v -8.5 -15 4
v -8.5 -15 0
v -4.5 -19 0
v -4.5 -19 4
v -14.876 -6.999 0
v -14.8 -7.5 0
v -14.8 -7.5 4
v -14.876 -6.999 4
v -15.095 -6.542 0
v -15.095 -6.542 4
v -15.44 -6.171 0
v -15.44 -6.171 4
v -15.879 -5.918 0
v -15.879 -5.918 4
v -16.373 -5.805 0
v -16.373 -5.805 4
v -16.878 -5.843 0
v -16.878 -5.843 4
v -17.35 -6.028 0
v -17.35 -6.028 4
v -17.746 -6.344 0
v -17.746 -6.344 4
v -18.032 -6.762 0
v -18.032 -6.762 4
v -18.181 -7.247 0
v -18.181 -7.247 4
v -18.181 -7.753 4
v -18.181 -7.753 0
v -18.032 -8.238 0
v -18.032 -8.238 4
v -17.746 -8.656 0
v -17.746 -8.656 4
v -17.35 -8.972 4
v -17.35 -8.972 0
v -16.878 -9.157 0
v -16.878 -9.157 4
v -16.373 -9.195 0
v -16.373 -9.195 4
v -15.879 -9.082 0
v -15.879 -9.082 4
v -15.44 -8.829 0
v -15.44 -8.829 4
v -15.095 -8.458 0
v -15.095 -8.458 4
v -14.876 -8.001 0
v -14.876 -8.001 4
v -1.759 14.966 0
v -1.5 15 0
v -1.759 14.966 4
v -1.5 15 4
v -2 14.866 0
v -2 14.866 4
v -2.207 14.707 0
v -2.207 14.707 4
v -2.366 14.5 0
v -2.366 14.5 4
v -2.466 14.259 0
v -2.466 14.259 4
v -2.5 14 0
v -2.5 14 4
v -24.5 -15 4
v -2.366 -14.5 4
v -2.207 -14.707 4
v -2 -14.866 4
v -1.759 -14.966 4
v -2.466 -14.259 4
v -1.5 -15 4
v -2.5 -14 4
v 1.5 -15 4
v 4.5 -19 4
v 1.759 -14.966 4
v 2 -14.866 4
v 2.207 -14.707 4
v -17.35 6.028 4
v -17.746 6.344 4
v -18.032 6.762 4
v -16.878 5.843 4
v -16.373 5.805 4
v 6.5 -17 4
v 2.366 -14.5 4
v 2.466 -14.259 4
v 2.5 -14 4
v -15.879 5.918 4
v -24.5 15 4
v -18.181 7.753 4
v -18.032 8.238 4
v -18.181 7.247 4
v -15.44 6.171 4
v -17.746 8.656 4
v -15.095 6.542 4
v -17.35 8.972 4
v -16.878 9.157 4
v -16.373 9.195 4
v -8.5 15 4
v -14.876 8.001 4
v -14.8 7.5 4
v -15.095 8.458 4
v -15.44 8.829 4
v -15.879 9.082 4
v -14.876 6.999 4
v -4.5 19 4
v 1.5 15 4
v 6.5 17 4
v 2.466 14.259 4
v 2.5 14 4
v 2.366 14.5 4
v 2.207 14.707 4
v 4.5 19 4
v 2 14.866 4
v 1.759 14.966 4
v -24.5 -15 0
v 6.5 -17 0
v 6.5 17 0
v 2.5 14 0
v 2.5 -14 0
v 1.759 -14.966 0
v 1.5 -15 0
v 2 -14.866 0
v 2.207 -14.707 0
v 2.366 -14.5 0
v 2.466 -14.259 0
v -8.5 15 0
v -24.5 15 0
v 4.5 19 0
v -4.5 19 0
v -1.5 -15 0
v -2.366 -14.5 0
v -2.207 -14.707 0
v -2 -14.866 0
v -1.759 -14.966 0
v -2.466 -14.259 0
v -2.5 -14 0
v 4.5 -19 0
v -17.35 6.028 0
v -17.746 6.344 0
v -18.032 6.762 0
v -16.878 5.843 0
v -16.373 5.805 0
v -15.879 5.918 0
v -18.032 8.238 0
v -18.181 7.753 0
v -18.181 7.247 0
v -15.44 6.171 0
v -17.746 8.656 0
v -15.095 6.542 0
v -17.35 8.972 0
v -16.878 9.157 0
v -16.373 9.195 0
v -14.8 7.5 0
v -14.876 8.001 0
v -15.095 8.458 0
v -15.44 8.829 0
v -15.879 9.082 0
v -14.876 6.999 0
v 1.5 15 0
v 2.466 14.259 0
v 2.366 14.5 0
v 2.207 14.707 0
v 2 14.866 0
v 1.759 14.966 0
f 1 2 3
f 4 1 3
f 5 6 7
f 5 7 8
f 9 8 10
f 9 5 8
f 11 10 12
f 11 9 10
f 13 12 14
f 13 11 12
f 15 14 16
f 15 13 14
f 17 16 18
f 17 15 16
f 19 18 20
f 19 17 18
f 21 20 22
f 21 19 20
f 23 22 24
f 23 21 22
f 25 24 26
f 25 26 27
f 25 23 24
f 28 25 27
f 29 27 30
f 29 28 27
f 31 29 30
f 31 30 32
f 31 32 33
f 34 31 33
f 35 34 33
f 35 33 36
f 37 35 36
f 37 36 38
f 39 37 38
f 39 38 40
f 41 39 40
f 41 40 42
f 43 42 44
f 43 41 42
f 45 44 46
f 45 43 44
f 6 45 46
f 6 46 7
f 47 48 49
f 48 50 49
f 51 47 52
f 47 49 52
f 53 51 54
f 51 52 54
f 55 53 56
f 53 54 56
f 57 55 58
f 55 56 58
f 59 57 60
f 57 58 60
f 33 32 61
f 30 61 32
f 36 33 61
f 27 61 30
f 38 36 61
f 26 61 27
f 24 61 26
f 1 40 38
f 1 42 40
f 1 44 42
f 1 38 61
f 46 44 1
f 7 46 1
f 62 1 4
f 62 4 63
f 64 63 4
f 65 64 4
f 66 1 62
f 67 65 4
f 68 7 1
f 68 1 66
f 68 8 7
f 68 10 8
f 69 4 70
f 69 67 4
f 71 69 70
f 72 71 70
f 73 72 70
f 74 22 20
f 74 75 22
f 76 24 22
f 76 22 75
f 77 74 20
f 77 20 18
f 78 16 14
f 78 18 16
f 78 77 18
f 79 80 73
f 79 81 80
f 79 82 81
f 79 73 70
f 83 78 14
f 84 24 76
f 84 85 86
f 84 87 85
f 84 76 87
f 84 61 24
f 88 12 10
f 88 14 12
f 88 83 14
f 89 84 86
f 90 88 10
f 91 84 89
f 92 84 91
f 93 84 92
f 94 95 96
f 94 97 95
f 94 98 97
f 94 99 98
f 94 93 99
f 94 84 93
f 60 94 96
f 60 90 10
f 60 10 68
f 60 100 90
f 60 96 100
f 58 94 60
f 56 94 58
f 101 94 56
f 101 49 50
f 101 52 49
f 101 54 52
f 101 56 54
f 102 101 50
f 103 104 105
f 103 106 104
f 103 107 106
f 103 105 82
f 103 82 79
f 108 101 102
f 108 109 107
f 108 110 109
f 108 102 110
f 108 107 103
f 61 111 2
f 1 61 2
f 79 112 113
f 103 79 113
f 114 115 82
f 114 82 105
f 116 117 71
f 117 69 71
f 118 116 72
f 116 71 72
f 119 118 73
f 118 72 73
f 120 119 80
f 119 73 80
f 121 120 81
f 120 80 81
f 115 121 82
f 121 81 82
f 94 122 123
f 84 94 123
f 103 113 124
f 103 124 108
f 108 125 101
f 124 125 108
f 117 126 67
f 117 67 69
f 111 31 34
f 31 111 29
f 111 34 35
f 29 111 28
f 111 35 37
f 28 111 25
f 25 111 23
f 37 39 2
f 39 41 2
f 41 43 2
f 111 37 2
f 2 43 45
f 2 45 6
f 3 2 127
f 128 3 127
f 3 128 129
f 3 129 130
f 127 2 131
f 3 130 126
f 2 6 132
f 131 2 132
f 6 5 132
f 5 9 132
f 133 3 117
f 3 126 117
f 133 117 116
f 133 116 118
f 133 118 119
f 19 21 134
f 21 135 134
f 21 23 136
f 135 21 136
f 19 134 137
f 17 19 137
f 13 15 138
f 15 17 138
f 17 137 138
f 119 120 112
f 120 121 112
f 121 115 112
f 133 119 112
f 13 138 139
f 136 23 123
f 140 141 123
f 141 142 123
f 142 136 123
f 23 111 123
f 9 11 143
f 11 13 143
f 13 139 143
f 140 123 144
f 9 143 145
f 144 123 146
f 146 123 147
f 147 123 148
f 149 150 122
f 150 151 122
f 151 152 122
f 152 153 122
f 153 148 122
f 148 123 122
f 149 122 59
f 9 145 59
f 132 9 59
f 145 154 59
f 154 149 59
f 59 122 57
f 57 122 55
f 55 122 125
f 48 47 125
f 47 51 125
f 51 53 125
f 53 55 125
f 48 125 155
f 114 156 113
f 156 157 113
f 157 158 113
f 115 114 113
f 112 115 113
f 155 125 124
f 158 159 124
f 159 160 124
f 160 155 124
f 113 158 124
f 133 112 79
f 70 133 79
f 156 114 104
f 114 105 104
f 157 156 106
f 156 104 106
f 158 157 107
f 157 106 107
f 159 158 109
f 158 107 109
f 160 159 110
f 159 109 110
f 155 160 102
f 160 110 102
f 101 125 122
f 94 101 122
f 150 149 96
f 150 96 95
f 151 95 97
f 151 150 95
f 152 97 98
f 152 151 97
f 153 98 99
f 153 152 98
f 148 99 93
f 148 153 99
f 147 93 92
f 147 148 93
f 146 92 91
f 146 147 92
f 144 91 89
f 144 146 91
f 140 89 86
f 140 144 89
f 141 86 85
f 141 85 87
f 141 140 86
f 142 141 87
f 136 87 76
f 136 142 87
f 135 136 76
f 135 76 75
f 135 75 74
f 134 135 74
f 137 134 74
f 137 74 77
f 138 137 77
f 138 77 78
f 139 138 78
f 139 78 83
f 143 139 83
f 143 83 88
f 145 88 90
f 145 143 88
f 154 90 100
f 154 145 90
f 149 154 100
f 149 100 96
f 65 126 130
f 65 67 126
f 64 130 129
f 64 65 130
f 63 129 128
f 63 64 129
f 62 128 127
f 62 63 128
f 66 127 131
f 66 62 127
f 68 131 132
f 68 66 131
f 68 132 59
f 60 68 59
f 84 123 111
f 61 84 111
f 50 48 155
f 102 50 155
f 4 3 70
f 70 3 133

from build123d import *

# Parameters (mm, degrees)
SKETCH1_W                = 13
SKETCH1_H                = 38
SKETCH1_W_2              = 5
SKETCH1_H_2              = 30
BOSS_EXTRUDE1_DEPTH      = 4
CHAMFER1_SIZE            = 2
BOSS_EXTRUDE2_DEPTH      = 2
BOSS_EXTRUDE2_DEPTH_BACK = 2
SKETCH2_R                = 1.7
FILLET2_R                = 1


with BuildPart() as part:
    # Sketch1 → Boss-Extrude1 (new body)
    with BuildSketch(Plane.XY):
        Rectangle(SKETCH1_W, SKETCH1_H)
        Rectangle(SKETCH1_W_2, SKETCH1_H_2, mode=Mode.SUBTRACT)
    extrude(amount=BOSS_EXTRUDE1_DEPTH)

    # Chamfer1
    chamfer1_edges = [part.edges().sort_by_distance(p)[0] for p in [
        (-6.5, 19, 2),
        (6.5, 19, 2),
        (6.5, -19, 2),
        (-6.5, -19, 2),
    ]]
    chamfer(chamfer1_edges, length=CHAMFER1_SIZE)

    # Sketch2 → Boss-Extrude2 (add, two sides: drawn at the far end of the back side and taken through both)
    with BuildSketch(Plane.XY.offset(2).offset(-BOSS_EXTRUDE2_DEPTH_BACK)):
        Polygon((-6.5, 17), (-8.5, 15), (-24.5, 15), (-24.5, -15), (-8.5, -15), (-6.5, -17), align=None)
        with Locations((-16.5, 7.5)):
            Circle(SKETCH2_R, mode=Mode.SUBTRACT)
        with Locations((-16.5, -7.5)):
            Circle(SKETCH2_R, mode=Mode.SUBTRACT)
    extrude(amount=BOSS_EXTRUDE2_DEPTH + BOSS_EXTRUDE2_DEPTH_BACK)

    # Fillet2
    fillet2_edges = [part.edges().sort_by_distance(p)[0] for p in [
        (-2.5, -15, 2),
        (2.5, -15, 2),
        (2.5, 15, 2),
        (-2.5, 15, 2),
    ]]
    fillet(fillet2_edges, radius=FILLET2_R)


solid = part.part
